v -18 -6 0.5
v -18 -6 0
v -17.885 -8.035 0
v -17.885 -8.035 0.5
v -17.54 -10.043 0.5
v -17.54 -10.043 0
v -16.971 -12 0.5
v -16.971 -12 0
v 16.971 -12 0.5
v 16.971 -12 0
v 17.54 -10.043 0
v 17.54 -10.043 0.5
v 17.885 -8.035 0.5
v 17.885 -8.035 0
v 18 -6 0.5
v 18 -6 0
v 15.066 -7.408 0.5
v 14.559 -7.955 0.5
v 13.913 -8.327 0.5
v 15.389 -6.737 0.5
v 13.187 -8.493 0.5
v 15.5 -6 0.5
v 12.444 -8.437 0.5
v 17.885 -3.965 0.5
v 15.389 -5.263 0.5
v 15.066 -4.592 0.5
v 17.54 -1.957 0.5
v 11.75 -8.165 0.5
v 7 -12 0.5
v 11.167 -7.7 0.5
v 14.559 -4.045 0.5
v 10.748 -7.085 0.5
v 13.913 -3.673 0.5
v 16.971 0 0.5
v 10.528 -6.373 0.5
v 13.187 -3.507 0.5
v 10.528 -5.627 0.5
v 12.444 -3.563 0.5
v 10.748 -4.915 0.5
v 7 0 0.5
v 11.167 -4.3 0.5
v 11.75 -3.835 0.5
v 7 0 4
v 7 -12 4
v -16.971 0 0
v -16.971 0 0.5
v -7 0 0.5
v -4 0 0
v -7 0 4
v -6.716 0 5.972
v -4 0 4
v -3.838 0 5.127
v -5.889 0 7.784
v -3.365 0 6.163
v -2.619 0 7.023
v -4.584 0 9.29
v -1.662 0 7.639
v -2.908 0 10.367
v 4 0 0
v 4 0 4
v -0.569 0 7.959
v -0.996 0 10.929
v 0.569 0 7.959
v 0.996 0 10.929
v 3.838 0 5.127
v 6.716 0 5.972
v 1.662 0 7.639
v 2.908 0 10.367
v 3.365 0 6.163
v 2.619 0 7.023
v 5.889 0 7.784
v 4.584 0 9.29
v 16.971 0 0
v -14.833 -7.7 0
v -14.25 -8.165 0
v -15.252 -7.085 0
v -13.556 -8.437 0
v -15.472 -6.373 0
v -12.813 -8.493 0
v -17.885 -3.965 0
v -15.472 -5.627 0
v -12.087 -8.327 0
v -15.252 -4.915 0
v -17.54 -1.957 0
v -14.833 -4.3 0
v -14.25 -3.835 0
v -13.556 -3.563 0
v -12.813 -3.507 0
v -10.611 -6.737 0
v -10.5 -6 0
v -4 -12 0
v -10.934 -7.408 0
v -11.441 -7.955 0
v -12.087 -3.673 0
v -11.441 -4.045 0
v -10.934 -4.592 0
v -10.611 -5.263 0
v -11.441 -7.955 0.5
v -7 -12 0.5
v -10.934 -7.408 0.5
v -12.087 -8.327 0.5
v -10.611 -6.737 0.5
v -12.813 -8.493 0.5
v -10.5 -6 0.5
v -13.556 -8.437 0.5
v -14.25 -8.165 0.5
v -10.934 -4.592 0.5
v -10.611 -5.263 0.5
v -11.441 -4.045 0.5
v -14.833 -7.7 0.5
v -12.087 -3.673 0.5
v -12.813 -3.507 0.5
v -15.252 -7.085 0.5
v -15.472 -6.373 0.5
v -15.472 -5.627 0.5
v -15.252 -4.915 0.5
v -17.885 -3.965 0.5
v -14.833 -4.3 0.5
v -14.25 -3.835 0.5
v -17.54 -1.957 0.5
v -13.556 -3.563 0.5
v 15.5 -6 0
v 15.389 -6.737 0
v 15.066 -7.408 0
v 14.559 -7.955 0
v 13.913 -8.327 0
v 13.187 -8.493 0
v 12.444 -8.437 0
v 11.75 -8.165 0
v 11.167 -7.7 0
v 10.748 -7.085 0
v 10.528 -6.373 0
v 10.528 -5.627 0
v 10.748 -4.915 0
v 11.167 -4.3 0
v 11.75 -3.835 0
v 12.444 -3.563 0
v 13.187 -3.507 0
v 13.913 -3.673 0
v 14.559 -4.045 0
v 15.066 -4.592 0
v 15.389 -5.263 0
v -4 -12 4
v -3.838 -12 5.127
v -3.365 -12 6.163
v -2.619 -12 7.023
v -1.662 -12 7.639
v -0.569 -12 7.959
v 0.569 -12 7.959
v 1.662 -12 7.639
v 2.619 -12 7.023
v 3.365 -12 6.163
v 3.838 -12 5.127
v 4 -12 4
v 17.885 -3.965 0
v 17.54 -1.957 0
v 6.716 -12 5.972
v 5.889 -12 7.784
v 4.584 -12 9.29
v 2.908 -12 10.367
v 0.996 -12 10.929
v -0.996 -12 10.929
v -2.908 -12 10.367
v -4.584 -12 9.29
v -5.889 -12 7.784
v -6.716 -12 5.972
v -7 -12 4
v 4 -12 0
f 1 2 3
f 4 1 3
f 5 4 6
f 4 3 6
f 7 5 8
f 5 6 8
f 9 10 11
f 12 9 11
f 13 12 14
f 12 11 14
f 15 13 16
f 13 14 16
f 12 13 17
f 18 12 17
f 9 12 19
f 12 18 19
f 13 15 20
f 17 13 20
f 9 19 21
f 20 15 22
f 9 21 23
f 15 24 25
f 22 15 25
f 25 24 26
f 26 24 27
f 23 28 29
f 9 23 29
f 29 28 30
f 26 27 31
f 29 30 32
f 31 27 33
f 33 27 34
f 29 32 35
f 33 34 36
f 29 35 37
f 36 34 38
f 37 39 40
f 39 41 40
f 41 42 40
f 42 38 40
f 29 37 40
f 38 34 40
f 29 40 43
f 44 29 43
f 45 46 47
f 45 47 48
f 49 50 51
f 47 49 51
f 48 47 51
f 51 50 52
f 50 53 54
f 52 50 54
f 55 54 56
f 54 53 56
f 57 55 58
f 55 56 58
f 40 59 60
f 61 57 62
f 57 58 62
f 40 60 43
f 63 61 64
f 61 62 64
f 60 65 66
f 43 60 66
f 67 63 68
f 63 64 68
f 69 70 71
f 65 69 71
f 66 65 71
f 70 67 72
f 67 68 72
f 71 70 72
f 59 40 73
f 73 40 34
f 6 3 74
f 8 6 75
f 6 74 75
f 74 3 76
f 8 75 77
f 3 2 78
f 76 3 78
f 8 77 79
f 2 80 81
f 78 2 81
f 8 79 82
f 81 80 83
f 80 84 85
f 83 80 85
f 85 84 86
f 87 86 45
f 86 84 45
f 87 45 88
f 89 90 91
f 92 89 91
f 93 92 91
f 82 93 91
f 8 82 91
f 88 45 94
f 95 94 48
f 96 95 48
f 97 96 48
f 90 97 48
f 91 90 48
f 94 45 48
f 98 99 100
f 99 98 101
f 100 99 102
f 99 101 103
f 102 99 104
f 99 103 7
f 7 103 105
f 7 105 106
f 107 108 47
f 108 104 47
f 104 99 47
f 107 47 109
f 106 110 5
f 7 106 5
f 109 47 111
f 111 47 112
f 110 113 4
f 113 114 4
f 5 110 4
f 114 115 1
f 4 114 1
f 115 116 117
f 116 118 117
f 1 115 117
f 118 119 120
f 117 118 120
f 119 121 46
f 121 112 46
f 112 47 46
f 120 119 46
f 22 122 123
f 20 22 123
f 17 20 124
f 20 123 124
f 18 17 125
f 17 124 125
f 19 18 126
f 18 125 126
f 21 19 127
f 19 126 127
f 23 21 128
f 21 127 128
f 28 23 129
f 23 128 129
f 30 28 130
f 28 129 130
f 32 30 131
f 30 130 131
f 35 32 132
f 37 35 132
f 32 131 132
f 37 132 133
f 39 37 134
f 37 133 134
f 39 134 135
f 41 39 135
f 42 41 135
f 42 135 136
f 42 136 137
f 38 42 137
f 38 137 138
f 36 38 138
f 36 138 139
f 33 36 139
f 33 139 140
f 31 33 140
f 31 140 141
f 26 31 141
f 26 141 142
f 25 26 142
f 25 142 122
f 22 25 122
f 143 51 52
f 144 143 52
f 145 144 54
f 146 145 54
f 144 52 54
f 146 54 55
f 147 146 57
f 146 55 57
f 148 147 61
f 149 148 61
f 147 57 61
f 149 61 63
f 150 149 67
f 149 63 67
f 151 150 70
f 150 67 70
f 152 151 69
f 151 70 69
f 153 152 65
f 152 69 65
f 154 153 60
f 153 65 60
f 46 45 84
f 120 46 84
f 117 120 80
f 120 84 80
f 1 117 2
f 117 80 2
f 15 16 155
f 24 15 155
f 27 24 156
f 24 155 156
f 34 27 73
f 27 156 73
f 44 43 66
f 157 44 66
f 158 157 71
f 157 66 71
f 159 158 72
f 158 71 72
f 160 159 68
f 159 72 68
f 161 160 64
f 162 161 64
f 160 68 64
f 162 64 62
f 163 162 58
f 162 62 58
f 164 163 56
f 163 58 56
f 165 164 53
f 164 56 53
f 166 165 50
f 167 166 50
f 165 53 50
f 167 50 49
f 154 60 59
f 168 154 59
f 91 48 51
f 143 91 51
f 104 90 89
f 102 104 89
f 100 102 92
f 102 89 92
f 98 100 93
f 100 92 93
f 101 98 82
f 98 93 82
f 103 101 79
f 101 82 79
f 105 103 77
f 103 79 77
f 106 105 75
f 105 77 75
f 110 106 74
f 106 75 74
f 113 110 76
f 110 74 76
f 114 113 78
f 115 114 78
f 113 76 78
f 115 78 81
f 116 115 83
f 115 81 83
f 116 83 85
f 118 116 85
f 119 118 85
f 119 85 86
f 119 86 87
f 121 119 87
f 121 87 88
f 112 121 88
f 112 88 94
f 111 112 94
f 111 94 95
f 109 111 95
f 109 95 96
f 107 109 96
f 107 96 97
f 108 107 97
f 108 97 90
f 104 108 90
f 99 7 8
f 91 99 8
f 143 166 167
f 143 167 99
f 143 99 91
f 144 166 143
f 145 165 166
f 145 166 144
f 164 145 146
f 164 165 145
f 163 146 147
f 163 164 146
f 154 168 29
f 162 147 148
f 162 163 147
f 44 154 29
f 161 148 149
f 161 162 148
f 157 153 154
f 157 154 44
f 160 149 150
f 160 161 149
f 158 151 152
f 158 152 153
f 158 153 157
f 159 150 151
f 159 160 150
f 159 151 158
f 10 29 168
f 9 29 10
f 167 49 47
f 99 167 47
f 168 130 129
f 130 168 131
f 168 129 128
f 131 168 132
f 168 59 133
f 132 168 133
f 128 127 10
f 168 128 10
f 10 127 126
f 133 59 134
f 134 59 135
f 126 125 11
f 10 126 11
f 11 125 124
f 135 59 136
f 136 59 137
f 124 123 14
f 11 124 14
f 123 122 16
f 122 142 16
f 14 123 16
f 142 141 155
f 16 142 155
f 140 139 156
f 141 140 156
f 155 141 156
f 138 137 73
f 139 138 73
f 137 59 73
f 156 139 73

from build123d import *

# Parameters (mm, degrees)
F1_DEPTH = 12
F2_R     = 2.5
F3_DEPTH = 25


with BuildPart() as f1:
    # F0 (on Front) → F1 (new body)
    with BuildSketch(Plane.XZ):
        with BuildLine():
            ThreePointArc((-4, 4), (0, 8), (4, 4))
            Line((4, 4), (4, 0))
            Line((4, 0), (18, 0))
            Line((18, 0), (18, 0.5))
            Line((18, 0.5), (7, 0.5))
            Line((7, 0.5), (7, 4))
            ThreePointArc((7, 4), (0, 11), (-7, 4))
            Line((-7, 4), (-7, 0.5))
            Line((-7, 0.5), (-18, 0.5))
            Line((-18, 0.5), (-18, 0))
            Line((-18, 0), (-4, 0))
            Line((-4, 0), (-4, 4))
        make_face()
    extrude(amount=F1_DEPTH)

    # F2 (on face) → F3 (cut)
    with BuildSketch(Plane(origin=(0, 0, 0), x_dir=(1, 0, 0), z_dir=(0, 0, -1))):
        with Locations((-13, 6)):
            Circle(F2_R)
        with Locations((13, 6)):
            Circle(F2_R)
        with BuildLine():
            ThreePointArc((-16.970563, 0), (-17.740774, 2.956164), (-18, 6))
            Line((-18, 6), (-18, 0))
            Line((-18, 0), (-16.970563, 0))
        make_face()
        with BuildLine():
            ThreePointArc((-18, 6), (-17.740774, 9.043836), (-16.970563, 12))
            Line((-16.970563, 12), (-18, 12))
            Line((-18, 12), (-18, 6))
        make_face()
        with BuildLine():
            ThreePointArc((16.970563, 12), (17.740774, 9.043836), (18, 6))
            Line((18, 6), (18, 12))
            Line((18, 12), (16.970563, 12))
        make_face()
        with BuildLine():
            Line((16.970563, 0), (18, 0))
            Line((18, 0), (18, 6))
            ThreePointArc((18, 6), (17.740774, 2.956164), (16.970563, 0))
        make_face()
    extrude(amount=-F3_DEPTH, mode=Mode.SUBTRACT)


solid = f1.part
